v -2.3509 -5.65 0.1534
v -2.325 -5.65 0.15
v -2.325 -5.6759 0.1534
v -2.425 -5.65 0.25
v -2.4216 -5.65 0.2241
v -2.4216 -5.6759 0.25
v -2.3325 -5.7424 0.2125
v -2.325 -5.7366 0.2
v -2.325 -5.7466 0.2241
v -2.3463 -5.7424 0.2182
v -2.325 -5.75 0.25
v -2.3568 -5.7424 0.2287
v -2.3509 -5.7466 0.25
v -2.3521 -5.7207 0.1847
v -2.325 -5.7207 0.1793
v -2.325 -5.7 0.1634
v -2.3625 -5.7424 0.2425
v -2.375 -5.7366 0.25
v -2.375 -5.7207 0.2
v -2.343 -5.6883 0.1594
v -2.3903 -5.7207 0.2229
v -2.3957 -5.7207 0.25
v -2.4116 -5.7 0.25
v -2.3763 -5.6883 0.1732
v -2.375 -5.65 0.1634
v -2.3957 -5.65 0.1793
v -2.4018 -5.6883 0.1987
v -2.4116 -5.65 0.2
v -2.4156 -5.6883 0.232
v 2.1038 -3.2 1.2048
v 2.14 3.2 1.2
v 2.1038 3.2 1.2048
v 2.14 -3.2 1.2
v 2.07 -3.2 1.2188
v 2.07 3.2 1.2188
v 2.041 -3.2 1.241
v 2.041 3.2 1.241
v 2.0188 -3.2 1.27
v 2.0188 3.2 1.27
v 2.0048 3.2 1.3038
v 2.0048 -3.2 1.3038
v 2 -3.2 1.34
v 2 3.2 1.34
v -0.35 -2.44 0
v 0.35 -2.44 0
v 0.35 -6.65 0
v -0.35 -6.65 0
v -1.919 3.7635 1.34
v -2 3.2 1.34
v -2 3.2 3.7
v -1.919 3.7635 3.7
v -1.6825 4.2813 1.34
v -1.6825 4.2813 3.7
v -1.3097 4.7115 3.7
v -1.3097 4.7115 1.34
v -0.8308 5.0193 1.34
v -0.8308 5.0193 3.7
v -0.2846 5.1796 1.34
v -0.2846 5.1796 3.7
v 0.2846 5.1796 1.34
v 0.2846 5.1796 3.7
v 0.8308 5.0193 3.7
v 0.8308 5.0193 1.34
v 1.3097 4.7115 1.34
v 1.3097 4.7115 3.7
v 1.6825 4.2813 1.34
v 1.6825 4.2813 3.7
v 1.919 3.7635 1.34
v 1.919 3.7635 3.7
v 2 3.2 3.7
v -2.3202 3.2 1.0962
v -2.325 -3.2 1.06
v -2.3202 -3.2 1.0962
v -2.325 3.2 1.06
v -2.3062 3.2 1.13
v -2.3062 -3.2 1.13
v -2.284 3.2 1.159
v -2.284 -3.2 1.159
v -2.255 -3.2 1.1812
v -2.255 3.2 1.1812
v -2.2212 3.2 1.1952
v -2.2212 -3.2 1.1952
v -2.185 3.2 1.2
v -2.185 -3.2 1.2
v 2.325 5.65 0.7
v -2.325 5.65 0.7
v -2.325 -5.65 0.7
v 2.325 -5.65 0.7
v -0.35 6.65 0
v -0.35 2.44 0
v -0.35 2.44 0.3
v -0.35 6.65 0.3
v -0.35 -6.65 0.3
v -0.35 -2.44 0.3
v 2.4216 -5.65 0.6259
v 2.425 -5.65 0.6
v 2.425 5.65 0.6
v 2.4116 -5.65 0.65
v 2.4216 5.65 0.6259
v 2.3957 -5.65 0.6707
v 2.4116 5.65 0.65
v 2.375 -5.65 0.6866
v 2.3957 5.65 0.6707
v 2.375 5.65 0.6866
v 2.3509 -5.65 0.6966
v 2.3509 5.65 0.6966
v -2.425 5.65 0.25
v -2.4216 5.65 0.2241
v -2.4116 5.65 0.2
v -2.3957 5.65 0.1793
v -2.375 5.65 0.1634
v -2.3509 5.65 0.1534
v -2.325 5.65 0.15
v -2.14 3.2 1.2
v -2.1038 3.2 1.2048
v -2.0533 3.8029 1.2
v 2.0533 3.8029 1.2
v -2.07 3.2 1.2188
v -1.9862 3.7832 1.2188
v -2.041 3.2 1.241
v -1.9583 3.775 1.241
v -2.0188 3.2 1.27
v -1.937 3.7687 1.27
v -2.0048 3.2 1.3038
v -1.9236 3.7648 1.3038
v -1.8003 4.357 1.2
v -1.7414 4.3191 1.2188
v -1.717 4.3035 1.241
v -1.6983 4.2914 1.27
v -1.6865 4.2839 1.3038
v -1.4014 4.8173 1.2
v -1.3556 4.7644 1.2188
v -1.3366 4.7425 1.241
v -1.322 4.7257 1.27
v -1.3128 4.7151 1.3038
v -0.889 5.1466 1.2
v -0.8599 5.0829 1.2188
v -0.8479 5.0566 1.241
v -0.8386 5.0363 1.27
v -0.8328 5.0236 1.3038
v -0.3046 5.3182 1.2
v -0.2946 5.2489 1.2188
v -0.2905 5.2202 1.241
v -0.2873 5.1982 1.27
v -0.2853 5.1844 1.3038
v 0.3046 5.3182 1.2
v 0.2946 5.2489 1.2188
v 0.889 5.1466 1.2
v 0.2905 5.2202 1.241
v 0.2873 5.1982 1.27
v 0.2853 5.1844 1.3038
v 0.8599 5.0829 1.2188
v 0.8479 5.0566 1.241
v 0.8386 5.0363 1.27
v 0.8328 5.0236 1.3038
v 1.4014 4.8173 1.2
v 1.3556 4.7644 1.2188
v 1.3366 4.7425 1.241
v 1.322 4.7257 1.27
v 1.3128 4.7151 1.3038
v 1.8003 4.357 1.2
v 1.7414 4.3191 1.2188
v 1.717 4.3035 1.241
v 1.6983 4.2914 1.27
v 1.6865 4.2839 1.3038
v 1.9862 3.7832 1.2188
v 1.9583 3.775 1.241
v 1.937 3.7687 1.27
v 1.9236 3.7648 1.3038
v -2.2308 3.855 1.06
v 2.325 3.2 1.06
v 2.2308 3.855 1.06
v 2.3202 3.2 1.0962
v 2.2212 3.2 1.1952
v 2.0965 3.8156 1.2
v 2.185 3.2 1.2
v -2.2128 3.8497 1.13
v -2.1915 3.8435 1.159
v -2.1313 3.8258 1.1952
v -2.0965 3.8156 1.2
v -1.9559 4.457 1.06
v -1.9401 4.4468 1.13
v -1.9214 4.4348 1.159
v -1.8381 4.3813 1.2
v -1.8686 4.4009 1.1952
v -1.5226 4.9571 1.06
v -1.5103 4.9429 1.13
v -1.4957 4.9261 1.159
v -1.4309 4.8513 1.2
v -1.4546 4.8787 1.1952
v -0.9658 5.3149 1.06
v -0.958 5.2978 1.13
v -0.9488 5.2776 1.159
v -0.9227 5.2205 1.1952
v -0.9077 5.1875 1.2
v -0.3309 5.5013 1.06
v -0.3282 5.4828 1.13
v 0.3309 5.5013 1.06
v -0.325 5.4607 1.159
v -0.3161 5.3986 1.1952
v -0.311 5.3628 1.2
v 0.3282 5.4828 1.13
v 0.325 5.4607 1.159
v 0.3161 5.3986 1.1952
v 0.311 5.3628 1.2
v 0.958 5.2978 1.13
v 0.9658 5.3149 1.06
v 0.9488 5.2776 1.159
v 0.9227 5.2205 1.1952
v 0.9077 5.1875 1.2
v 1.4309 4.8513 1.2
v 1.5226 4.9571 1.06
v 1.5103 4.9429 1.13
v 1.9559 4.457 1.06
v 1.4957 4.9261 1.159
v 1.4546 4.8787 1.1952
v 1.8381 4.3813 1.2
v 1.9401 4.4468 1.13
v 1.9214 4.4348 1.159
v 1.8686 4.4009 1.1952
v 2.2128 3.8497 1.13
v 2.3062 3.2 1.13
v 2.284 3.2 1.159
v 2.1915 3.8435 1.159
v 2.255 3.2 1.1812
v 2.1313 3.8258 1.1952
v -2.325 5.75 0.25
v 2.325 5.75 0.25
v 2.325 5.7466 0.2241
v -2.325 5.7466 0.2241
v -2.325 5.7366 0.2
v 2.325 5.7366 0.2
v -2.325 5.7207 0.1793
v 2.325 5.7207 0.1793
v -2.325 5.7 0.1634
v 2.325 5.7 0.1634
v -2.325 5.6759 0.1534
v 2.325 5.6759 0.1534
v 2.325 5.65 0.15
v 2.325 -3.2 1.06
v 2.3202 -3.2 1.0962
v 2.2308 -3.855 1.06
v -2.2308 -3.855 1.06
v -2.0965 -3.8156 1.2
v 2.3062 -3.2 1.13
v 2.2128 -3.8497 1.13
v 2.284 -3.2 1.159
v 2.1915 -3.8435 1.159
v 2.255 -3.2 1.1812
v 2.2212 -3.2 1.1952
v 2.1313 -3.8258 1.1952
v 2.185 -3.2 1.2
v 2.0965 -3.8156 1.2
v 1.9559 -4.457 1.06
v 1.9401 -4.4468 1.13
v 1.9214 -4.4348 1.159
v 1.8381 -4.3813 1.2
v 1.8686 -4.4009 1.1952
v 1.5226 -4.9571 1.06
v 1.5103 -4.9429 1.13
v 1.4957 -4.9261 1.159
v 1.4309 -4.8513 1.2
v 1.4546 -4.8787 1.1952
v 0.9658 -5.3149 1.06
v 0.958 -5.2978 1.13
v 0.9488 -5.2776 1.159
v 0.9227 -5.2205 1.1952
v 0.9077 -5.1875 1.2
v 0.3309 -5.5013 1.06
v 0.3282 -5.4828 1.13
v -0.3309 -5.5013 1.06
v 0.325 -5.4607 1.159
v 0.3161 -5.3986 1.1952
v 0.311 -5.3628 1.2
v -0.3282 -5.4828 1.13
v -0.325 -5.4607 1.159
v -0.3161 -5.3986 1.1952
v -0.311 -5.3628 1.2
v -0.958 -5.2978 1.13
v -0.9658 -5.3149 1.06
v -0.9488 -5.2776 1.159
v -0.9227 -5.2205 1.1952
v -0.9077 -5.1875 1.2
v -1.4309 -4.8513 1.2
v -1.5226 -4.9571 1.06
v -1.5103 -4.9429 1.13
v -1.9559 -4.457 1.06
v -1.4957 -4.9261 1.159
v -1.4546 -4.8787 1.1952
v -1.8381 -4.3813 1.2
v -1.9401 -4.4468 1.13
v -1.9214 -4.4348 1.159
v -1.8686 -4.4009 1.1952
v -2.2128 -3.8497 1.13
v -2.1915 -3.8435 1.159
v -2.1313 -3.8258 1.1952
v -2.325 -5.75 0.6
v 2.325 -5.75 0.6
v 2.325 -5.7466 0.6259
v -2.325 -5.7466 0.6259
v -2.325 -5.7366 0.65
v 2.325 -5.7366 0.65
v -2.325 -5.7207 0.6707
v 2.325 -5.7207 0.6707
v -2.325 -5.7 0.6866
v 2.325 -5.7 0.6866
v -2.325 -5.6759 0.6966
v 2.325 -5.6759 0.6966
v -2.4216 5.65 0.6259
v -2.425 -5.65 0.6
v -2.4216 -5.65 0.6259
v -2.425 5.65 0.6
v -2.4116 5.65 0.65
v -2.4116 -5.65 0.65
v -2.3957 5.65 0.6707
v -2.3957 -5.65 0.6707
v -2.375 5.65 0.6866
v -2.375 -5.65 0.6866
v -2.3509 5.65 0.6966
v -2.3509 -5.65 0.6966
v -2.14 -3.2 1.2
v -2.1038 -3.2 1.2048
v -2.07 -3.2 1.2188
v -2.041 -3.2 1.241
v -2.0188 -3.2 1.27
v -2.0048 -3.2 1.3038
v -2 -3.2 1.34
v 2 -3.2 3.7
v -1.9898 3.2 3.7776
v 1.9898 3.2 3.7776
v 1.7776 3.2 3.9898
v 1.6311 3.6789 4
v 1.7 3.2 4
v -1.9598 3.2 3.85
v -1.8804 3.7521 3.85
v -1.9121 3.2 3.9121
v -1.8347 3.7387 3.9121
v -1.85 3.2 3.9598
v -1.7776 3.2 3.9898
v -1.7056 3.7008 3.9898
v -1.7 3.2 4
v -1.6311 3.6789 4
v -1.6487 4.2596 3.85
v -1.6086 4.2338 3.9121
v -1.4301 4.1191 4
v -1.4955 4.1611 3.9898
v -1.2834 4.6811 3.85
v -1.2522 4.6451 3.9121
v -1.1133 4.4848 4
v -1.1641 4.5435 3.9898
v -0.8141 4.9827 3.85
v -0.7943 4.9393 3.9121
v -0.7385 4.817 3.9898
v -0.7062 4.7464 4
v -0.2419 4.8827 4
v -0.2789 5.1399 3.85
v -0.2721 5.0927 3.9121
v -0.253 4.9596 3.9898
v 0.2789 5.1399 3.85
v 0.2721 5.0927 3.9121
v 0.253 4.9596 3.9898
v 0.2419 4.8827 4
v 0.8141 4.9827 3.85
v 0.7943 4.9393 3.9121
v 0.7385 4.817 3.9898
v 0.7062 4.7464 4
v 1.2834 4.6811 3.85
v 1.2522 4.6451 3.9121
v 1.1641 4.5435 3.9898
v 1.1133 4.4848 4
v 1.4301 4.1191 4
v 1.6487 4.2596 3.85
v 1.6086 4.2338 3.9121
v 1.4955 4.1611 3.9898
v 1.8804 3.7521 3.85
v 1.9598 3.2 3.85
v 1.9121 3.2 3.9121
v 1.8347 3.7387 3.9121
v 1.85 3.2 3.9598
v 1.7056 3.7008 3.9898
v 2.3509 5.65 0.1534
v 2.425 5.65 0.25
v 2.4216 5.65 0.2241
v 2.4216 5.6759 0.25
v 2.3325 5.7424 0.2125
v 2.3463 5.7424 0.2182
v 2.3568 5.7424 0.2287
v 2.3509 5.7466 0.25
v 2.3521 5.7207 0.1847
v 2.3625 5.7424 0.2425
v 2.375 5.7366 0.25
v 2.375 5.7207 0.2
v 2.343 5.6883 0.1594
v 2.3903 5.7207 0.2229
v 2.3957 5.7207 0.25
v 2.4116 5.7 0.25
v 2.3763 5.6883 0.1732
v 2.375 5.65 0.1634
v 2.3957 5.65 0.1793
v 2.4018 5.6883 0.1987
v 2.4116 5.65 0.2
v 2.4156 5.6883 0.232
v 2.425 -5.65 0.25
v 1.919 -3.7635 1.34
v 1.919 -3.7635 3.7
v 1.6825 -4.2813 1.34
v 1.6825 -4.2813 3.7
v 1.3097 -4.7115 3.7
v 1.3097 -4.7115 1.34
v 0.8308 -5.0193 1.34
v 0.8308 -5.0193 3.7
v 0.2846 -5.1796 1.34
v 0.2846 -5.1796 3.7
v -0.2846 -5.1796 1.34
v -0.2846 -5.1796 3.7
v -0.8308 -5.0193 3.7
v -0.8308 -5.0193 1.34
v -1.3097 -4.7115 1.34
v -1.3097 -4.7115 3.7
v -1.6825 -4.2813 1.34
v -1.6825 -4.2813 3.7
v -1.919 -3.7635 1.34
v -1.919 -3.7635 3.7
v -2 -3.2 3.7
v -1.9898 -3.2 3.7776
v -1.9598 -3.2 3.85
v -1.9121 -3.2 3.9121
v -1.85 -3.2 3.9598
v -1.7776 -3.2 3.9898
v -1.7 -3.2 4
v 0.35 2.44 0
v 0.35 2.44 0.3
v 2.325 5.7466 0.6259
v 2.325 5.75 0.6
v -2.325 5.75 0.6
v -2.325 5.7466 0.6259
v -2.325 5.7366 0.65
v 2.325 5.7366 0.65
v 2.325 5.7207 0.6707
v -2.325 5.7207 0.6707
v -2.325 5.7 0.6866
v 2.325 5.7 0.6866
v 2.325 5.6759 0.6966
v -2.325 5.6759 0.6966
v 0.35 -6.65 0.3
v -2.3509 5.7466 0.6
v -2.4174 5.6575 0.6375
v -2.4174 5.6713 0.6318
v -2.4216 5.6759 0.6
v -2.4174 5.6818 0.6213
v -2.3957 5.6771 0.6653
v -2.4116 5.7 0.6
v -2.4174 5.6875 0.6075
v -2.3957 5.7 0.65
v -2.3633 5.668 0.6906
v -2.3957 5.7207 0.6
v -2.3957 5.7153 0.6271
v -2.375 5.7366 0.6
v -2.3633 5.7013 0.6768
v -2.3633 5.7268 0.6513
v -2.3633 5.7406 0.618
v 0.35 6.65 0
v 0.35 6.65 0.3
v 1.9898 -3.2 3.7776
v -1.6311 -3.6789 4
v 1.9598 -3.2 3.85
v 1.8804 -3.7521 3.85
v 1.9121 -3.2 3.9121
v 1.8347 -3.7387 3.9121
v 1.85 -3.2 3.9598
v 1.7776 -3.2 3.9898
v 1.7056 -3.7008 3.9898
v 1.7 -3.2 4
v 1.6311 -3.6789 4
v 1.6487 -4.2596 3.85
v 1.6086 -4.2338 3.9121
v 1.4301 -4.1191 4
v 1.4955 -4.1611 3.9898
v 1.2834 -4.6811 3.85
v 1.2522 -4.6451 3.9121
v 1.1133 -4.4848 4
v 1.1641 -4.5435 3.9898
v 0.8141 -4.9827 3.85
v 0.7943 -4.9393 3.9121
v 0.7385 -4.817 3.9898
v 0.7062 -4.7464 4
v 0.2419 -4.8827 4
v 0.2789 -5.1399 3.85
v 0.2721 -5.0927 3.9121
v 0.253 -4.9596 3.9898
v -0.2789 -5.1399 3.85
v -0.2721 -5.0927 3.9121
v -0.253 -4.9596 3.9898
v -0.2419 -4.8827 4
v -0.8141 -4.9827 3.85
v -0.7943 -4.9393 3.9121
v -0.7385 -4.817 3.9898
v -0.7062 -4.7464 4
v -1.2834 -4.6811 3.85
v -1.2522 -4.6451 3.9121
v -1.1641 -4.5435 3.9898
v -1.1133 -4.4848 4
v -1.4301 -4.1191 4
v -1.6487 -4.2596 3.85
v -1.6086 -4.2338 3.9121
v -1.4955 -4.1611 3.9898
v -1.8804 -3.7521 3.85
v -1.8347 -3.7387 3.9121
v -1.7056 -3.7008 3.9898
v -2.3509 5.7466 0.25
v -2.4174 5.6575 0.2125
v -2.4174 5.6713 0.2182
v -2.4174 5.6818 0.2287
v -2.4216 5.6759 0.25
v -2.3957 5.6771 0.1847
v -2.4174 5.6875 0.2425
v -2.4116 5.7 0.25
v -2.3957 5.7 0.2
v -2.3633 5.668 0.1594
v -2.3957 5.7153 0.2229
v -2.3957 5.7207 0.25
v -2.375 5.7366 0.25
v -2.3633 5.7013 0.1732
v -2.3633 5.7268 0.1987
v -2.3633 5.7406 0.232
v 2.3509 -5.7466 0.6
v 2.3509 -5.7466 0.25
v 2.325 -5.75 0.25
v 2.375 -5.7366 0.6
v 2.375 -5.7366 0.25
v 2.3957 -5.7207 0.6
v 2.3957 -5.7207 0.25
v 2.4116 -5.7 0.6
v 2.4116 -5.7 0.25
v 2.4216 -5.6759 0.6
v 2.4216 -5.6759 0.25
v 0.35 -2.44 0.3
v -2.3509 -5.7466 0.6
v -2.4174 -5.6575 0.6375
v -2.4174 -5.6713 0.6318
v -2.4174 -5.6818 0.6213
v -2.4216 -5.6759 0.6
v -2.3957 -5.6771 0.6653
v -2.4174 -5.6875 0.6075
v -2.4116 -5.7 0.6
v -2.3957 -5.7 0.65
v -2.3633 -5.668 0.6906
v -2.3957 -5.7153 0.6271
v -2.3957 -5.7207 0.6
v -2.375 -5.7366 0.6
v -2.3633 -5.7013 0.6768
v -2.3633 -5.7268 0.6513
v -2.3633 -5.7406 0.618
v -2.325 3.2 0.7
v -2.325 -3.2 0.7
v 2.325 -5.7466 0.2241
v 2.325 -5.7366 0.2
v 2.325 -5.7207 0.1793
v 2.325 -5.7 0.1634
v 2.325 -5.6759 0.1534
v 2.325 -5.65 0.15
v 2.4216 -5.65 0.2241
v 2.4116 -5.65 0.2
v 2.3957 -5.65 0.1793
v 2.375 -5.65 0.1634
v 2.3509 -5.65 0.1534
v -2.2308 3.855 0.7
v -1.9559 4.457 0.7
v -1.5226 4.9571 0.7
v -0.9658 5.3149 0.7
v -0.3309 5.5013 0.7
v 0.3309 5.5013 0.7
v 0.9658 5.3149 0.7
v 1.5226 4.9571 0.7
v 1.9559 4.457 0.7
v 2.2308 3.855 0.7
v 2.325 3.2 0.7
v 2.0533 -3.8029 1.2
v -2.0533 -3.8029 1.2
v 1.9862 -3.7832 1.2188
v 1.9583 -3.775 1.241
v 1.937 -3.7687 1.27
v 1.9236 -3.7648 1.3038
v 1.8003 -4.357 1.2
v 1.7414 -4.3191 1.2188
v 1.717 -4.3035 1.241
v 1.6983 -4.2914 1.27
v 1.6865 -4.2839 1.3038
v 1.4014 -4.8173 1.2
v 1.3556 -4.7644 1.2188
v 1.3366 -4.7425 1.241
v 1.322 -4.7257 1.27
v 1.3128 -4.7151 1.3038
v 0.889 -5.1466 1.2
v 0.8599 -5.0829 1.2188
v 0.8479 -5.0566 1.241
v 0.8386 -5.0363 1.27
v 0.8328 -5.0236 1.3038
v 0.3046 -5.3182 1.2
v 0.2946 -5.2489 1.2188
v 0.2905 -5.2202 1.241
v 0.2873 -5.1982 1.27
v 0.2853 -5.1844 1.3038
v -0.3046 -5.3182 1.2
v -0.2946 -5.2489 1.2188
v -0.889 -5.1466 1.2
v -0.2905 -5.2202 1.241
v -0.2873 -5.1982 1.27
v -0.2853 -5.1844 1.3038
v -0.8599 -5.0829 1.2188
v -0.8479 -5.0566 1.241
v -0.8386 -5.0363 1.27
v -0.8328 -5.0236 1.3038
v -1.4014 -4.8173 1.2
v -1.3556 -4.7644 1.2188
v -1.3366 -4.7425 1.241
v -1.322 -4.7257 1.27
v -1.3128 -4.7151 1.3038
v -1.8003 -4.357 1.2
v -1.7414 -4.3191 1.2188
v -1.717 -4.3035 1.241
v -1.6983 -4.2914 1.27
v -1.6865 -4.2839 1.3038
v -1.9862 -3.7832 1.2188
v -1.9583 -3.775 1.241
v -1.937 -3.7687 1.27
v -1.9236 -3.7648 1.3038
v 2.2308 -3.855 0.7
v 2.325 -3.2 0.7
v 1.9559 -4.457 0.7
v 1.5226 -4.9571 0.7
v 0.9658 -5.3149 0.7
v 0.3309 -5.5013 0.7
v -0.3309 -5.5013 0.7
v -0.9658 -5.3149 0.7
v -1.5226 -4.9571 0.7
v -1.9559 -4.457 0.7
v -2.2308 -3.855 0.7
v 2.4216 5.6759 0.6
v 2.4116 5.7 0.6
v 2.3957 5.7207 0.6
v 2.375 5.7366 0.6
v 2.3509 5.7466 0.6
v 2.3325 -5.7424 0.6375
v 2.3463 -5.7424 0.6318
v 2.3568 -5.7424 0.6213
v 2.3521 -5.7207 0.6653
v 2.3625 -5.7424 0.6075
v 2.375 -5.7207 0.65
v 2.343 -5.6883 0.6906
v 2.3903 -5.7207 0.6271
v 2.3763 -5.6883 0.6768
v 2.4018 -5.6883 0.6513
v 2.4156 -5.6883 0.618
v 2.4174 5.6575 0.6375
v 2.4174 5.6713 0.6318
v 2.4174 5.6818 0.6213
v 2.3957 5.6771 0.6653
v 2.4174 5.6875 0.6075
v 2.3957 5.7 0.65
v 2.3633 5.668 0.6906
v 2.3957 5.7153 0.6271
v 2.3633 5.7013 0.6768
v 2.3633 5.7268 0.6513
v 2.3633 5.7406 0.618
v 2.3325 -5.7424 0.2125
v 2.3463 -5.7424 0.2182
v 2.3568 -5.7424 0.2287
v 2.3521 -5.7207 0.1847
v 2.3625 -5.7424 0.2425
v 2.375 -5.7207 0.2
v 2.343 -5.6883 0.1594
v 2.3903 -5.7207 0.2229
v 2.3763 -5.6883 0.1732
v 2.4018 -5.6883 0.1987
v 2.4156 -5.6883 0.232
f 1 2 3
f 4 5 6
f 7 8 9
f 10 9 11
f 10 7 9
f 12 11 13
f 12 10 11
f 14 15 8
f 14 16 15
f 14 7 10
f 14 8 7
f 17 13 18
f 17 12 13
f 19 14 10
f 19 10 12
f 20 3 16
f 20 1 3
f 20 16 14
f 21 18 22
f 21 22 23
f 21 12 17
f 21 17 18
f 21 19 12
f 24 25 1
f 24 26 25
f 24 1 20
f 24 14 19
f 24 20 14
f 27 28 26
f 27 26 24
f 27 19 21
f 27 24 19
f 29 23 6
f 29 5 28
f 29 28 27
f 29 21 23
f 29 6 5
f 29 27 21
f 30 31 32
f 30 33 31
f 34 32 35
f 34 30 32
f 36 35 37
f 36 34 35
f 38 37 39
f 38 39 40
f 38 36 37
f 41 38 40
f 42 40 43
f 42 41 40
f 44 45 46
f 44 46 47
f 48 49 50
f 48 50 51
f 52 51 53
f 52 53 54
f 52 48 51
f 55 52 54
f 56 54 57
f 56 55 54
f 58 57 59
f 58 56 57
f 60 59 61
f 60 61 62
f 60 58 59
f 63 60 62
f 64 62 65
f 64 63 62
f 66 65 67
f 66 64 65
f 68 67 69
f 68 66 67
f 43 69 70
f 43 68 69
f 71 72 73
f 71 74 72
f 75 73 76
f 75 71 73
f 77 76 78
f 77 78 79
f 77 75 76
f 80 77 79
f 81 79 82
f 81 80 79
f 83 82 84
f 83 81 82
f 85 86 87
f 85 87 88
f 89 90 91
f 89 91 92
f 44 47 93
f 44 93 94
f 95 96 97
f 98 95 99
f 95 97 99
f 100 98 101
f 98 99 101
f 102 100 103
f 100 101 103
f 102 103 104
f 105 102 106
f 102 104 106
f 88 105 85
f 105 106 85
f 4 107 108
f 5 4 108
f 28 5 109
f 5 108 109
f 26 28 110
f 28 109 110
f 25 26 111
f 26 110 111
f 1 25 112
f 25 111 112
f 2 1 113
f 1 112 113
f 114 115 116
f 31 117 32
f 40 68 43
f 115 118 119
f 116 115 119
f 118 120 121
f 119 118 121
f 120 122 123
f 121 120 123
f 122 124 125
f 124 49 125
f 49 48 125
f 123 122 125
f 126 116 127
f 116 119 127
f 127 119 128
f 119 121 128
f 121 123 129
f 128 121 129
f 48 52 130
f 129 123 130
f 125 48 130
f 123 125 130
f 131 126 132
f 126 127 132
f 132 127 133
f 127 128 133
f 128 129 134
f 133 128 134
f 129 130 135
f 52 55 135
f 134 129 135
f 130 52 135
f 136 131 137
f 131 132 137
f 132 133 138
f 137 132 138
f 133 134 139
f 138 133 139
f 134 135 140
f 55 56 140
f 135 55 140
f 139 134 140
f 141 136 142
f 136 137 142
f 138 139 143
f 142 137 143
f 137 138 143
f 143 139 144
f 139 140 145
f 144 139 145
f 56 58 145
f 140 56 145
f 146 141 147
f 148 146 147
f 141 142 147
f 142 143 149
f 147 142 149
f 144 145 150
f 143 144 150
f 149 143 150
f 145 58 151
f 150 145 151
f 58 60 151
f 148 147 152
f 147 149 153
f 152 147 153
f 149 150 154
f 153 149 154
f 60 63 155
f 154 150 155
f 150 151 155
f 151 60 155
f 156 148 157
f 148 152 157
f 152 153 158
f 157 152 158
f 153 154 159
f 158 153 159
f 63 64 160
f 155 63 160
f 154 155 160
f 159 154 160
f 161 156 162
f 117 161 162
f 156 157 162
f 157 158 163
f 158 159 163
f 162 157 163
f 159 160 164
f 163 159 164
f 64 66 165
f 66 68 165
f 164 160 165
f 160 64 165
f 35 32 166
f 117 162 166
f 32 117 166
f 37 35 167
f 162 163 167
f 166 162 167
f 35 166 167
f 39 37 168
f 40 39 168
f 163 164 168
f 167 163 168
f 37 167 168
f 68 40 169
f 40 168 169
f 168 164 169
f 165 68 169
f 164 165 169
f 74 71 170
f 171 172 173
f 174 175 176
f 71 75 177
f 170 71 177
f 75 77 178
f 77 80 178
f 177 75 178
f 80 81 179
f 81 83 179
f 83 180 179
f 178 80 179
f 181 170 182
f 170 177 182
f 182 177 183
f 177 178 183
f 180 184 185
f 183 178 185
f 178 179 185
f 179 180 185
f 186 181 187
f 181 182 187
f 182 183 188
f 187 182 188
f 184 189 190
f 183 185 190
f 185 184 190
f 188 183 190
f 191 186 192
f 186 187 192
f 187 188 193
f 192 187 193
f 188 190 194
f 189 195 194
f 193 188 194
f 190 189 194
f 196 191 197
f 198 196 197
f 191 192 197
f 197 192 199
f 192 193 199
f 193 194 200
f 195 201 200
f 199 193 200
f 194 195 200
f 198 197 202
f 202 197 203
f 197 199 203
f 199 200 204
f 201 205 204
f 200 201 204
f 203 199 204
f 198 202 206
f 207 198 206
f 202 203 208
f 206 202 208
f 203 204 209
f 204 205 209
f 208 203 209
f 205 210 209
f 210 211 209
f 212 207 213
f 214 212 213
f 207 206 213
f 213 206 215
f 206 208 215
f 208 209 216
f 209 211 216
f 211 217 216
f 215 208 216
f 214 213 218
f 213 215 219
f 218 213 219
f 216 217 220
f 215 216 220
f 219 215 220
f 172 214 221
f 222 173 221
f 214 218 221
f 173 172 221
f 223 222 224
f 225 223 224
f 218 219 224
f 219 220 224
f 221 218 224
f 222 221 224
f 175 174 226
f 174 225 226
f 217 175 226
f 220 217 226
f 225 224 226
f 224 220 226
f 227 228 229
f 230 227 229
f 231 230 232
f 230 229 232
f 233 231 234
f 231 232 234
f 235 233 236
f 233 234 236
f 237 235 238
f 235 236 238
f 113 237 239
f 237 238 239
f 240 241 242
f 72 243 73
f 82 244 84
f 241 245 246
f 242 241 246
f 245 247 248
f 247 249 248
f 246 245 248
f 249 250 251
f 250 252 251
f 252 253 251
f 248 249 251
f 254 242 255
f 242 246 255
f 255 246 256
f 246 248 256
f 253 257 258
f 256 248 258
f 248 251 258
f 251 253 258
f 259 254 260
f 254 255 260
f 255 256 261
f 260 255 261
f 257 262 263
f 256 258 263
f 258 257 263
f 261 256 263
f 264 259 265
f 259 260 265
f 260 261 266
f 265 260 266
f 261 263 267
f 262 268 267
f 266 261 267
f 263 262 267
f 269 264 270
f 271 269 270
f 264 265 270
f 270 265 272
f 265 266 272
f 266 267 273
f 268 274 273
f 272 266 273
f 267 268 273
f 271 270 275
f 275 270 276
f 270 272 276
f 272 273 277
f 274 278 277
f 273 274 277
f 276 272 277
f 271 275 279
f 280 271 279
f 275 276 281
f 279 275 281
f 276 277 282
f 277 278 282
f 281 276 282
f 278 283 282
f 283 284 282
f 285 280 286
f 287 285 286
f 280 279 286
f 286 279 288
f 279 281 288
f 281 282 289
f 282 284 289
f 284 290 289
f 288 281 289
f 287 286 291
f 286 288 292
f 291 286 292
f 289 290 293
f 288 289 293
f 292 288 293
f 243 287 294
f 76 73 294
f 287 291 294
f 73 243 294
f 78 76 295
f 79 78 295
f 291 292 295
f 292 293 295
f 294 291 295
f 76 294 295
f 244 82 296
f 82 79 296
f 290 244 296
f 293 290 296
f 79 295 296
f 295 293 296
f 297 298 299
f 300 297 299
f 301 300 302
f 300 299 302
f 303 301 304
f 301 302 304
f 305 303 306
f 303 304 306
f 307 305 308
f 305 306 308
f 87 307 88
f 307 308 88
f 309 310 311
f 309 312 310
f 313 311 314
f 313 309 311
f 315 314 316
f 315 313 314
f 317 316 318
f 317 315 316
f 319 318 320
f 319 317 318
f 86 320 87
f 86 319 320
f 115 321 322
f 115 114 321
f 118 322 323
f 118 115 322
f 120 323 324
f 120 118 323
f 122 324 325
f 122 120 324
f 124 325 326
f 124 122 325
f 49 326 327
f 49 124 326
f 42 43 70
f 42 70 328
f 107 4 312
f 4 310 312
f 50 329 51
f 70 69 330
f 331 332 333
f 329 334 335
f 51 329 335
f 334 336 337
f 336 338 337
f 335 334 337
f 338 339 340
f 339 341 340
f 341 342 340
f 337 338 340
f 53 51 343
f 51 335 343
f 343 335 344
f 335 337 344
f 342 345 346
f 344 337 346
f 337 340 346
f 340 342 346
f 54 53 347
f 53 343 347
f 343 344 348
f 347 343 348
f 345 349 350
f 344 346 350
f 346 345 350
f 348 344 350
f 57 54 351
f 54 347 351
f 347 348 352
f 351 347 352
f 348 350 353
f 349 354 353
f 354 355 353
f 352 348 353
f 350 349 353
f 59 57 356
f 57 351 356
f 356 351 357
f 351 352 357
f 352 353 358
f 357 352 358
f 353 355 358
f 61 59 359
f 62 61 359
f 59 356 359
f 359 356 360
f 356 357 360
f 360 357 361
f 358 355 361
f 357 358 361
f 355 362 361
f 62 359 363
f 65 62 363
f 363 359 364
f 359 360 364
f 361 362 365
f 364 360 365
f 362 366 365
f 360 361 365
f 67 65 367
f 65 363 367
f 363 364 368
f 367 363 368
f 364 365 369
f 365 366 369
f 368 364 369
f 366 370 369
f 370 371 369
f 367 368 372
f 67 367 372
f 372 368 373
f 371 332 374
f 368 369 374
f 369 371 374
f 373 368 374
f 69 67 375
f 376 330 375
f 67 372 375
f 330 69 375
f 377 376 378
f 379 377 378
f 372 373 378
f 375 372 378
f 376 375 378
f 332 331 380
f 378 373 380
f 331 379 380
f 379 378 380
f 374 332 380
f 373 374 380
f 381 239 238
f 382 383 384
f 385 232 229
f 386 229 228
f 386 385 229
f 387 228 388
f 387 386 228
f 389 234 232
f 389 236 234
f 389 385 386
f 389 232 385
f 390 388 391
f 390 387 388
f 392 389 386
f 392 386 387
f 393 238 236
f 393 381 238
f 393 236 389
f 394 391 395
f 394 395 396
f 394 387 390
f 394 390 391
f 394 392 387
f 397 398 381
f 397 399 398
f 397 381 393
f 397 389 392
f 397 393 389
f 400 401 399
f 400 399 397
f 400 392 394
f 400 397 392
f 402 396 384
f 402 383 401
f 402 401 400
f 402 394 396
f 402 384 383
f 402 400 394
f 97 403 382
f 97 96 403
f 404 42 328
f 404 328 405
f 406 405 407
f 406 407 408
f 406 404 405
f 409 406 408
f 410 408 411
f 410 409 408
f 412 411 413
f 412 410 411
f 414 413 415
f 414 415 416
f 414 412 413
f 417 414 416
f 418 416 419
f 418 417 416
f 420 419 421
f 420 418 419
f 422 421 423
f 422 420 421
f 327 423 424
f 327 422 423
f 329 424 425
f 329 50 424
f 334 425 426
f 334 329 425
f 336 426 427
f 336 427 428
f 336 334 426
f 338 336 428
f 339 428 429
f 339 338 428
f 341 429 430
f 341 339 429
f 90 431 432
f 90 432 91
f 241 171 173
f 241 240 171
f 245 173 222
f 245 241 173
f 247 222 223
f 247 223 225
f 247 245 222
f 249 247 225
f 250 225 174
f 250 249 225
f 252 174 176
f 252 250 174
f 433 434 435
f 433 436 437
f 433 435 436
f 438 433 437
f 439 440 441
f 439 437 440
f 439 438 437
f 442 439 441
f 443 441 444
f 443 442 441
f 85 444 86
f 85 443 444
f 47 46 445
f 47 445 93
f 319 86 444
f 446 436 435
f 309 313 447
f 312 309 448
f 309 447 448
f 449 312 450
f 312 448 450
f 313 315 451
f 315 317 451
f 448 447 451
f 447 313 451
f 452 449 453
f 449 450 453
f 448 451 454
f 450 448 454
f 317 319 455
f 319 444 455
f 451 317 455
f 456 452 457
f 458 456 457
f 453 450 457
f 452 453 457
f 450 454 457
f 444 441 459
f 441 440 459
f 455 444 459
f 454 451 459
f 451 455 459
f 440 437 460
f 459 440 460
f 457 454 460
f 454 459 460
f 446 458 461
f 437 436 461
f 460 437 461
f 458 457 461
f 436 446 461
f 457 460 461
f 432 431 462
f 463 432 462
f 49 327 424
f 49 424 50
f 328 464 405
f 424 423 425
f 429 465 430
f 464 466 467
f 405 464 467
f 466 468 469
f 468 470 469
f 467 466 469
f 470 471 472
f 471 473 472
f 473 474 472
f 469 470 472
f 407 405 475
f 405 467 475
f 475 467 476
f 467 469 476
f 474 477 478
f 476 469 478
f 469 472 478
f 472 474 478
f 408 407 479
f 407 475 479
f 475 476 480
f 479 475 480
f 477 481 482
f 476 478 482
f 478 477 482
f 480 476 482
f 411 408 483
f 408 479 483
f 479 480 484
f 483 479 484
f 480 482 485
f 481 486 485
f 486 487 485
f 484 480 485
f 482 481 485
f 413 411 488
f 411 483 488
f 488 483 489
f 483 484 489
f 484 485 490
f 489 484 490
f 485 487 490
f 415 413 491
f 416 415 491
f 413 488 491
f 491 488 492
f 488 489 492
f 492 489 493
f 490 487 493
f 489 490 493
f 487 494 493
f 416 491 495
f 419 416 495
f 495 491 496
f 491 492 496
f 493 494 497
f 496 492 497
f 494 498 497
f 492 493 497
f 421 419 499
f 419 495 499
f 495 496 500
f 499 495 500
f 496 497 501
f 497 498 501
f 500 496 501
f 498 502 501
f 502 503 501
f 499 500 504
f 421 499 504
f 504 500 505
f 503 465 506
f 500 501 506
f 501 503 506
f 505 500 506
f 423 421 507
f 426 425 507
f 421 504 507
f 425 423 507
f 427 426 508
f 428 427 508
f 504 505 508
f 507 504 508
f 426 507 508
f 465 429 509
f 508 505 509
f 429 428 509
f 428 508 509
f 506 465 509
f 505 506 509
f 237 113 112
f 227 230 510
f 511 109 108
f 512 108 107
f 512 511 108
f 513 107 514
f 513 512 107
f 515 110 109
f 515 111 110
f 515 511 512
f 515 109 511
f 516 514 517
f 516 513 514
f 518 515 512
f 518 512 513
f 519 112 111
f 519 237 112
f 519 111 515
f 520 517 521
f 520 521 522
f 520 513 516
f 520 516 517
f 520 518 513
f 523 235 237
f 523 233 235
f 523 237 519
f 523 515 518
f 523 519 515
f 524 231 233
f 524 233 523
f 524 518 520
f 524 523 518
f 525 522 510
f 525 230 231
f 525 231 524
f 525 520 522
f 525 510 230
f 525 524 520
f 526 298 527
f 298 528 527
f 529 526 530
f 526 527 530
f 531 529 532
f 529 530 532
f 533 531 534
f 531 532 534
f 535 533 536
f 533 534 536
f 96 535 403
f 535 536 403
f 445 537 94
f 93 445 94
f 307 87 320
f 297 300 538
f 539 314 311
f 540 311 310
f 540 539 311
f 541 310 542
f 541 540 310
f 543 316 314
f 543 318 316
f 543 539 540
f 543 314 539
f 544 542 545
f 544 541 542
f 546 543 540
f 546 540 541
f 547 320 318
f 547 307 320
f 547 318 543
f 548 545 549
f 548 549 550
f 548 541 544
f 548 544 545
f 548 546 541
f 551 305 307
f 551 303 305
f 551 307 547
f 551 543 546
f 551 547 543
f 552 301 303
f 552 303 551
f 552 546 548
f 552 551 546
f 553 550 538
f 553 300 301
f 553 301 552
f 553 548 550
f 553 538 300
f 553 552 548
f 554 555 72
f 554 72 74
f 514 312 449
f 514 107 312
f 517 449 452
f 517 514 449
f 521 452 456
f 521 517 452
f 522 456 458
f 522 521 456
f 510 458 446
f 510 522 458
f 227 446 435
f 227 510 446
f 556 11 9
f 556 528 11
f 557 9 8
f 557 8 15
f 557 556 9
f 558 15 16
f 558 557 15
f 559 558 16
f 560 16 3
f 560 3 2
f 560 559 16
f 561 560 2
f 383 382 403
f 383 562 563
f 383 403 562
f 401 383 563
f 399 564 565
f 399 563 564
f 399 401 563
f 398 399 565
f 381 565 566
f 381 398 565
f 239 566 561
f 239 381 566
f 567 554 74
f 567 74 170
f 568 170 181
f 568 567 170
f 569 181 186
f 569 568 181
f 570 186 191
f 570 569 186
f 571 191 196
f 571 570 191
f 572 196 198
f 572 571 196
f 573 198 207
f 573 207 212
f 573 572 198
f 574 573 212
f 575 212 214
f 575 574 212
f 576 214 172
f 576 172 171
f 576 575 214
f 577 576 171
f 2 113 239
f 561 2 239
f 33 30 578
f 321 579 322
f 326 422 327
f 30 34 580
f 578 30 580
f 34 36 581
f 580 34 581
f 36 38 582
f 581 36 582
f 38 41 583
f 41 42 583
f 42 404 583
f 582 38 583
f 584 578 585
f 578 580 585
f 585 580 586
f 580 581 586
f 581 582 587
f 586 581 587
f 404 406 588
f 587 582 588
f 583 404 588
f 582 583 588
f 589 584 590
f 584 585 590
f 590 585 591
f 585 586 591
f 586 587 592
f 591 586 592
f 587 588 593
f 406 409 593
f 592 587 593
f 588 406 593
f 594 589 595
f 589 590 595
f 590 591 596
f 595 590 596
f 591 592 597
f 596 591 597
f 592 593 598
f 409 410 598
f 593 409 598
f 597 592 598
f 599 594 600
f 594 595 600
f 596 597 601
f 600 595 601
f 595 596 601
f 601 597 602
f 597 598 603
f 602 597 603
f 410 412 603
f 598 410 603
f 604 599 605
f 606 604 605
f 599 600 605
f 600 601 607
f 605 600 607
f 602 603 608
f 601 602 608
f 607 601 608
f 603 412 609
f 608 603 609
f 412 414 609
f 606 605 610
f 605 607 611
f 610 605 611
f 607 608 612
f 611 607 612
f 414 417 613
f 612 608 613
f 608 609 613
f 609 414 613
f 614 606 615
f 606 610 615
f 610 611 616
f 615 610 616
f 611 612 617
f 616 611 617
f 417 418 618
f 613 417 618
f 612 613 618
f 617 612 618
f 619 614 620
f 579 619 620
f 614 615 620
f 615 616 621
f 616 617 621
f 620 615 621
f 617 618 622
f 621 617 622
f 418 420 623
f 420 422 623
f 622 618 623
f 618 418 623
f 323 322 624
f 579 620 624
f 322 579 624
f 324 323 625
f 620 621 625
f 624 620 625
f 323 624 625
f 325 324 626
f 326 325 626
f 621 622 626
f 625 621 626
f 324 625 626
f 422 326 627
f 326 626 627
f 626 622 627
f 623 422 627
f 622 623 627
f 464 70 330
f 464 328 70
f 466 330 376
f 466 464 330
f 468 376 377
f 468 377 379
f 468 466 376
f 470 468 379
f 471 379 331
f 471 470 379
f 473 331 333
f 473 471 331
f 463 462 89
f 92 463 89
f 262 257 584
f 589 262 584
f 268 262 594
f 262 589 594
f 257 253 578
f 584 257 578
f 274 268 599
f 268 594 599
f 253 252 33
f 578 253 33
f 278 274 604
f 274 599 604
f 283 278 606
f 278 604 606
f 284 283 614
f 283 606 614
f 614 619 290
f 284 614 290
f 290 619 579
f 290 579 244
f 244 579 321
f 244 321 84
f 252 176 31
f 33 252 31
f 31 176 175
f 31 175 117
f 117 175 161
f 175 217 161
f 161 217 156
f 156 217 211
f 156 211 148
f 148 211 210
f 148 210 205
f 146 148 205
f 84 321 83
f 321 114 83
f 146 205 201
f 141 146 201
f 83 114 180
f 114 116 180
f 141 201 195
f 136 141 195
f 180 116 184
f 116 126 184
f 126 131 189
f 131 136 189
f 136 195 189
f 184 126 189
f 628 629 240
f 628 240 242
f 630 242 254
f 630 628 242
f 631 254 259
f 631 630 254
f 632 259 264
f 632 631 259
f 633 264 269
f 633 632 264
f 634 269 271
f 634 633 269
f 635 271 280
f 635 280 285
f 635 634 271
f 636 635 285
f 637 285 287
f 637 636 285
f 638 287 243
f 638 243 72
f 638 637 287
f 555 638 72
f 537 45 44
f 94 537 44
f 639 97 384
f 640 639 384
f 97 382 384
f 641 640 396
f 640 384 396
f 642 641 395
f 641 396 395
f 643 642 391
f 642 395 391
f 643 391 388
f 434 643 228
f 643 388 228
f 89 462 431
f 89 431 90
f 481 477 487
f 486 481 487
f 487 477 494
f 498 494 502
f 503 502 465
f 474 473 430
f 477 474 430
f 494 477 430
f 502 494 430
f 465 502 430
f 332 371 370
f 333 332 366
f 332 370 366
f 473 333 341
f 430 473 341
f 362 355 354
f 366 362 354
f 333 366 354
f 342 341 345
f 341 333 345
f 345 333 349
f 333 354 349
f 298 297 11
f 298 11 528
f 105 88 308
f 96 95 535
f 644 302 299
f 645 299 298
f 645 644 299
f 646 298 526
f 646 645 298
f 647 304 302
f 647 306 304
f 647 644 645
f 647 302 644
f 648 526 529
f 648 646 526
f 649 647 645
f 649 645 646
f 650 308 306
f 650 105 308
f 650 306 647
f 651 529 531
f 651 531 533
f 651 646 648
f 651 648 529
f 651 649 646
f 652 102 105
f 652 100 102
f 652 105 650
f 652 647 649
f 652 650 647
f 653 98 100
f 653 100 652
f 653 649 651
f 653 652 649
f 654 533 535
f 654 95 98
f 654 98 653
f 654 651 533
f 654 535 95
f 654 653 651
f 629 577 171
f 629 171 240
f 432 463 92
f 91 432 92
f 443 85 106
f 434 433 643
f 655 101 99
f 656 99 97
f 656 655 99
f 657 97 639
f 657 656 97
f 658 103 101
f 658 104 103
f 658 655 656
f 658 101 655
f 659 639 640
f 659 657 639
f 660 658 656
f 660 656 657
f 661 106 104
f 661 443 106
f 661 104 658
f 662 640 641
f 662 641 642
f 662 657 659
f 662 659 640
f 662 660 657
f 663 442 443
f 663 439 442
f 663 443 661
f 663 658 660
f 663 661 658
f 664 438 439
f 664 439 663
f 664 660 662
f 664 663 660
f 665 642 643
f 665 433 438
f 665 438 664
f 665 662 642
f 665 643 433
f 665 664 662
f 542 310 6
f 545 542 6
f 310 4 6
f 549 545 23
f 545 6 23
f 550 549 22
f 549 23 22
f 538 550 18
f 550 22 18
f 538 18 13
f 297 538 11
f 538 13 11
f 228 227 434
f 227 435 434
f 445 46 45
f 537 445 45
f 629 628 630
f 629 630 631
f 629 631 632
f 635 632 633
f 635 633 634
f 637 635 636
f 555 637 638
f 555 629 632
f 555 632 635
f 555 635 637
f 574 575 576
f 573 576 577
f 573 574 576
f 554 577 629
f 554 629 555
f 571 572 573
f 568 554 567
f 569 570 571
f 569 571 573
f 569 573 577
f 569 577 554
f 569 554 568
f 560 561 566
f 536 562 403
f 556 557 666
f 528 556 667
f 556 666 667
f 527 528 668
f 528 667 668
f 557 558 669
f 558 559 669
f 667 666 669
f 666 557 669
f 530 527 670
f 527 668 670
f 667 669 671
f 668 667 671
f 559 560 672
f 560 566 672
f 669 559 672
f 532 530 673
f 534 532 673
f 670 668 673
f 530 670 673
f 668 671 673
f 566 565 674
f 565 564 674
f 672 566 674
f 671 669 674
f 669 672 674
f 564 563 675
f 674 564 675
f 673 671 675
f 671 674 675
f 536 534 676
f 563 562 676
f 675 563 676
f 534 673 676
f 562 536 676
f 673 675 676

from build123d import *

# Parameters (mm, degrees)
BOSS_EXTRUDE1_START = 0.7
BOSS_EXTRUDE1_DEPTH = 0.5
BOSS_EXTRUDE2_DEPTH = 2.8
FILLET2_R           = 0.14
FILLET_3_R          = 0.3
SKETCH_3_W          = 4.85
SKETCH_3_H          = 11.5
EXTRUDE_3_DEPTH     = 0.55
FILLET_4_R          = 0.1
SKETCH_1_W          = 0.7
SKETCH_1_H          = 4.21
EXTRUDE_4_DEPTH     = 0.3
EXTRUDE_4_2_DEPTH   = 0.3


with BuildPart() as part:
    # Sketch2 → Boss-Extrude1 (new body)
    with BuildSketch(Plane.XY.offset(BOSS_EXTRUDE1_START)):
        with BuildLine():
            Line((2.325, 3.2), (2.325, -3.2))
            ThreePointArc((2.325, -3.2), (0, -5.525), (-2.325, -3.2))
            Line((-2.325, -3.2), (-2.325, 3.2))
            ThreePointArc((-2.325, 3.2), (0, 5.525), (2.325, 3.2))
        make_face()
    extrude(amount=BOSS_EXTRUDE1_DEPTH)

    # Sketch3 → Boss-Extrude2 (add)
    with BuildSketch(Plane.XY.offset(1.2)):
        with BuildLine():
            Line((-2, -3.2), (-2, 3.2))
            ThreePointArc((-2, 3.2), (0, 5.2), (2, 3.2))
            Line((2, 3.2), (2, -3.2))
            ThreePointArc((2, -3.2), (0, -5.2), (-2, -3.2))
        make_face()
    extrude(amount=BOSS_EXTRUDE2_DEPTH)

    # Fillet2
    fillet2_edges = [part.edges().sort_by_distance(p)[0] for p in [
        (0, -5.525, 1.2),
        (2.325, 0, 1.2),
        (0, -5.2, 1.2),
        (2, 0, 1.2),
        (0, 5.2, 1.2),
        (-2, 0, 1.2),
        (0, 5.525, 1.2),
        (-2.325, 0, 1.2),
    ]]
    fillet(fillet2_edges, radius=FILLET2_R)

    # Скругление3
    fillet_3_edges = [part.edges().sort_by_distance(p)[0] for p in [
        (0, -5.2, 4),
        (2, 0, 4),
        (0, 5.2, 4),
        (-2, 0, 4),
    ]]
    fillet(fillet_3_edges, radius=FILLET_3_R)


with BuildPart() as body_2:
    # Эскиз3 → Бобышка-Вытянуть3 (new body)
    with BuildSketch(Plane.XY.offset(0.7)):
        Rectangle(SKETCH_3_W, SKETCH_3_H)
    extrude(amount=-EXTRUDE_3_DEPTH)

    # Скругление4
    fillet_4_edges = [body_2.edges().sort_by_distance(p)[0] for p in [
        (2.425, 0, 0.15),
        (0, 5.75, 0.15),
        (-2.425, 0, 0.15),
        (0, 5.75, 0.7),
        (2.425, 0, 0.7),
        (0, -5.75, 0.7),
        (-2.425, 0, 0.7),
        (0, -5.75, 0.15),
        (-2.425, 5.75, 0.425),
        (2.425, 5.75, 0.425),
        (2.425, -5.75, 0.425),
        (-2.425, -5.75, 0.425),
    ]]
    fillet(fillet_4_edges, radius=FILLET_4_R)


with BuildPart() as body_3:
    # Эскиз1 → Бобышка-Вытянуть4 (new body)
    with BuildSketch(Plane(origin=(0, 0, 0), x_dir=(-1, 0, 0), z_dir=(0, 0, -1))):
        with Locations((0, -4.545)):
            Rectangle(SKETCH_1_W, SKETCH_1_H)
    extrude(amount=-EXTRUDE_4_DEPTH)


with BuildPart() as body_4:
    # Эскиз1 → Extrude 4 2 (new body)
    with BuildSketch(Plane(origin=(0, 0, 0), x_dir=(-1, 0, 0), z_dir=(0, 0, -1))):
        with Locations((0, 4.545)):
            Rectangle(SKETCH_1_W, SKETCH_1_H)
    extrude(amount=-EXTRUDE_4_2_DEPTH)


solid = Compound([part.part, body_2.part, body_3.part, body_4.part])
